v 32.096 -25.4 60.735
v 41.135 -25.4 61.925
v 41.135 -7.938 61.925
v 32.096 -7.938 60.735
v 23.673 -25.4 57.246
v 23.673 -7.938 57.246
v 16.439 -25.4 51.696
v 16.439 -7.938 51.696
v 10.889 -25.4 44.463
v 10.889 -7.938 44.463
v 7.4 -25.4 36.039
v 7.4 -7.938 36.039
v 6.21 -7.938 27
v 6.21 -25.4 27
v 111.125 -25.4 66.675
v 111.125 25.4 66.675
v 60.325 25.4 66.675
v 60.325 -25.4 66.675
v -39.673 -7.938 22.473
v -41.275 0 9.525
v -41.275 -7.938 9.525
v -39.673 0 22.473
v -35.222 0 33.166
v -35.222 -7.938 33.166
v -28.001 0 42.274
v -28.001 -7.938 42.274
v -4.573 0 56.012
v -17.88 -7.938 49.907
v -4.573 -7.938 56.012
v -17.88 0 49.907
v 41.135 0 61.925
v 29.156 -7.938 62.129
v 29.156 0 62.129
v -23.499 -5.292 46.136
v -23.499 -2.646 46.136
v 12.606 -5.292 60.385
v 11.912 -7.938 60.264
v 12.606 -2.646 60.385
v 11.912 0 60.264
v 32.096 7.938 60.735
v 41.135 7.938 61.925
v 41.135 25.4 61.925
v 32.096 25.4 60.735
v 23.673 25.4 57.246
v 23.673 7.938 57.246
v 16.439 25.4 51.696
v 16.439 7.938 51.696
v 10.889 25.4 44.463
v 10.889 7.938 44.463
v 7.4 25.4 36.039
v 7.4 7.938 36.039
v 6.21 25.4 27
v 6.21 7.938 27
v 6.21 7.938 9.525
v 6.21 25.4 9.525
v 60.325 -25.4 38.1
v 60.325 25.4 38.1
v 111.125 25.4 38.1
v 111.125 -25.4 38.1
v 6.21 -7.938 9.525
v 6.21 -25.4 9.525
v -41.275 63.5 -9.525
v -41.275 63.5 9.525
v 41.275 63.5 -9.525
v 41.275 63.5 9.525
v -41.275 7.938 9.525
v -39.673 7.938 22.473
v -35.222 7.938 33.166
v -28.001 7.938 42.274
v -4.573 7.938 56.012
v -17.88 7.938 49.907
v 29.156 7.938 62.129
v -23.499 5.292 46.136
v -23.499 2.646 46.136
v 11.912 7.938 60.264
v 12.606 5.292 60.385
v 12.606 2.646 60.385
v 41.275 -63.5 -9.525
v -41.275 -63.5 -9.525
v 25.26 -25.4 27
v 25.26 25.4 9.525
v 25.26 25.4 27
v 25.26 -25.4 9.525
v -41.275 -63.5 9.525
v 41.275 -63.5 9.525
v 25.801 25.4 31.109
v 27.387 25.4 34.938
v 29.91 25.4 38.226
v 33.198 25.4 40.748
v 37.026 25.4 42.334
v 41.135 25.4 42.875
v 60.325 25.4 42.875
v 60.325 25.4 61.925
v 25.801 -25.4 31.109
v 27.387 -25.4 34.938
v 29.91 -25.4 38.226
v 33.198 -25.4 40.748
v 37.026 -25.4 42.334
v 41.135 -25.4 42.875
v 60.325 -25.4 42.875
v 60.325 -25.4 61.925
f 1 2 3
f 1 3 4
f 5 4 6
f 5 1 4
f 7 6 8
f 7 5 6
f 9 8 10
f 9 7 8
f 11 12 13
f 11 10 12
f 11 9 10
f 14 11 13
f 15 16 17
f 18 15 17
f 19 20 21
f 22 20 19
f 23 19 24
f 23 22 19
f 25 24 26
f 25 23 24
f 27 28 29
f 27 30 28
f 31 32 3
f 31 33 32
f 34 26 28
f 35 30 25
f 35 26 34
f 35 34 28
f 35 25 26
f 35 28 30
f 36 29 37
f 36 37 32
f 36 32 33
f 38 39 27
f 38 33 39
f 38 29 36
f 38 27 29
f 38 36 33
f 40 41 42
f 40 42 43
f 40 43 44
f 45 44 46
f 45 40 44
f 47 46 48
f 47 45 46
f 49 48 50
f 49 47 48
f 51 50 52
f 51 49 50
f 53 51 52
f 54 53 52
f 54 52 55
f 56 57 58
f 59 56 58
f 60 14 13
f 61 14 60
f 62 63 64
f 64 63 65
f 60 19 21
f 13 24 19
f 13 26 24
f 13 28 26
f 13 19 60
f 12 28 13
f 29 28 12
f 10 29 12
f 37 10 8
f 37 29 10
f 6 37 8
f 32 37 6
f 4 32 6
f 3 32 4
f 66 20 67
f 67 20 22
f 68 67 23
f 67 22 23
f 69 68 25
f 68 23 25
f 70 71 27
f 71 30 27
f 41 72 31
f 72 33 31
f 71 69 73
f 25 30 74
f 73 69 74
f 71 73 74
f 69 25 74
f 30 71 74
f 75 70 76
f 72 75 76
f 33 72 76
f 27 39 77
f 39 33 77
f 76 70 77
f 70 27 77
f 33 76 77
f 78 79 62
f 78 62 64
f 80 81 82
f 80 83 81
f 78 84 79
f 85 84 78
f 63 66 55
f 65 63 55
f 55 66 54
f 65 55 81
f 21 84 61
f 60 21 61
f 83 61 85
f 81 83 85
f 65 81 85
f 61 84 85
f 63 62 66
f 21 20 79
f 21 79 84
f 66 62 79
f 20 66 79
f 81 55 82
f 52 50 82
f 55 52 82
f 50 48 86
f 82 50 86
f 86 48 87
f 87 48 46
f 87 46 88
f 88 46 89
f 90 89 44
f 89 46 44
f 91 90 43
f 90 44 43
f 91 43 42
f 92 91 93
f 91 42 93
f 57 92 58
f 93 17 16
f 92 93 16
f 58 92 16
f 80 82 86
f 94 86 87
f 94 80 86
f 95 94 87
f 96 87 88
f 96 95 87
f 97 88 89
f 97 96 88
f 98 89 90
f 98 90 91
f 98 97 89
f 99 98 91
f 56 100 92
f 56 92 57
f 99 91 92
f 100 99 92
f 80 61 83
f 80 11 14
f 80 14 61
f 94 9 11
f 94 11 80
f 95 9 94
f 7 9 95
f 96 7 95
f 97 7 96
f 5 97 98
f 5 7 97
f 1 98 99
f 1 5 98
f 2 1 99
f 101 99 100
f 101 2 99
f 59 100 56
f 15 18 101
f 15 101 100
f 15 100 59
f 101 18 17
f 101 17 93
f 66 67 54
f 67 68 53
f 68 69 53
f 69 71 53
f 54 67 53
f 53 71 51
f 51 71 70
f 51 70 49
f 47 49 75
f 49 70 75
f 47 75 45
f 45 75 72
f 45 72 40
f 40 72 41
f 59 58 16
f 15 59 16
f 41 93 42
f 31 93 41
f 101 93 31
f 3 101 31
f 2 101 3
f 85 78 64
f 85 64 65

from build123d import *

# Parameters (mm, degrees)
F0_W     = 47.4850616275
F0_H     = 19.05
F0_W_2   = 16.0149383725
F0_W_3   = 19.05
F1_DEPTH = 63.5
F2_DEPTH = 25.4
F3_DEPTH = 7.9375


with BuildPart() as f1:
    # F0 (on Front) → F1 (new body, symmetric)
    with BuildSketch(Plane.XZ):
        with Locations((-17.5324691862, 0)):
            Rectangle(F0_W, F0_H)
        with Locations((33.2675308138, 0)):
            Rectangle(F0_W_2, F0_H)
        with Locations((15.7350616275, 0)):
            Rectangle(F0_W_3, F0_H)
    extrude(amount=F1_DEPTH, both=True)

    # F0 (on Front) → F2 (join, symmetric)
    with BuildSketch(Plane.XZ):
        with BuildLine():
            Line((6.2100616275, 9.525), (25.2600616275, 9.525))
            Line((25.2600616275, 9.525), (25.2600616275, 27.0002))
            ThreePointArc((25.2600616275, 27.0002), (29.9097414762, 38.2255201513), (41.1350616275, 42.8752))
            Line((41.1350616275, 42.8752), (60.325, 42.8752))
            Line((60.325, 42.8752), (60.325, 61.9252))
            Line((60.325, 61.9252), (41.1350616275, 61.9252))
            ThreePointArc((41.1350616275, 61.9252), (16.4393572946, 51.6959043329), (6.2100616275, 27.0002))
            Line((6.2100616275, 27.0002), (6.2100616275, 9.525))
        make_face()
        with Locations((15.7350616275, 0)):
            Rectangle(F0_W_3, F0_H)
        with Locations((33.2675308138, 0)):
            Rectangle(F0_W_2, F0_H)
        Polygon((60.325, 61.9252), (60.325, 42.8752), (60.325, 38.1), (98.117655005, 38.1), (98.2993766665, 66.675), (60.325, 66.675), align=None)
        Polygon((98.2993766665, 66.675), (98.117655005, 38.1), (111.125, 38.1), (111.125, 66.675), align=None)
    extrude(amount=F2_DEPTH, both=True)

    # F0 (on Front) → F3 (join, symmetric)
    with BuildSketch(Plane.XZ):
        with BuildLine():
            Line((-41.275, 9.525), (6.2100616275, 9.525))
            Line((6.2100616275, 9.525), (6.2100616275, 27.0002))
            ThreePointArc((6.2100616275, 27.0002), (16.4393572946, 51.6959043329), (41.1350616275, 61.9252))
            add(Edge.make_bspline(
                [(-41.275, 9.525), (-41.299830026, 60.5354448615), (25.0295793076, 63.5215594349), (41.1350616275, 61.9252)],
                knots=[0, 0, 0, 0, 97.6585849656, 97.6585849656, 97.6585849656, 97.6585849656], degree=3))
        make_face()
    extrude(amount=F3_DEPTH, both=True)


solid = f1.part
